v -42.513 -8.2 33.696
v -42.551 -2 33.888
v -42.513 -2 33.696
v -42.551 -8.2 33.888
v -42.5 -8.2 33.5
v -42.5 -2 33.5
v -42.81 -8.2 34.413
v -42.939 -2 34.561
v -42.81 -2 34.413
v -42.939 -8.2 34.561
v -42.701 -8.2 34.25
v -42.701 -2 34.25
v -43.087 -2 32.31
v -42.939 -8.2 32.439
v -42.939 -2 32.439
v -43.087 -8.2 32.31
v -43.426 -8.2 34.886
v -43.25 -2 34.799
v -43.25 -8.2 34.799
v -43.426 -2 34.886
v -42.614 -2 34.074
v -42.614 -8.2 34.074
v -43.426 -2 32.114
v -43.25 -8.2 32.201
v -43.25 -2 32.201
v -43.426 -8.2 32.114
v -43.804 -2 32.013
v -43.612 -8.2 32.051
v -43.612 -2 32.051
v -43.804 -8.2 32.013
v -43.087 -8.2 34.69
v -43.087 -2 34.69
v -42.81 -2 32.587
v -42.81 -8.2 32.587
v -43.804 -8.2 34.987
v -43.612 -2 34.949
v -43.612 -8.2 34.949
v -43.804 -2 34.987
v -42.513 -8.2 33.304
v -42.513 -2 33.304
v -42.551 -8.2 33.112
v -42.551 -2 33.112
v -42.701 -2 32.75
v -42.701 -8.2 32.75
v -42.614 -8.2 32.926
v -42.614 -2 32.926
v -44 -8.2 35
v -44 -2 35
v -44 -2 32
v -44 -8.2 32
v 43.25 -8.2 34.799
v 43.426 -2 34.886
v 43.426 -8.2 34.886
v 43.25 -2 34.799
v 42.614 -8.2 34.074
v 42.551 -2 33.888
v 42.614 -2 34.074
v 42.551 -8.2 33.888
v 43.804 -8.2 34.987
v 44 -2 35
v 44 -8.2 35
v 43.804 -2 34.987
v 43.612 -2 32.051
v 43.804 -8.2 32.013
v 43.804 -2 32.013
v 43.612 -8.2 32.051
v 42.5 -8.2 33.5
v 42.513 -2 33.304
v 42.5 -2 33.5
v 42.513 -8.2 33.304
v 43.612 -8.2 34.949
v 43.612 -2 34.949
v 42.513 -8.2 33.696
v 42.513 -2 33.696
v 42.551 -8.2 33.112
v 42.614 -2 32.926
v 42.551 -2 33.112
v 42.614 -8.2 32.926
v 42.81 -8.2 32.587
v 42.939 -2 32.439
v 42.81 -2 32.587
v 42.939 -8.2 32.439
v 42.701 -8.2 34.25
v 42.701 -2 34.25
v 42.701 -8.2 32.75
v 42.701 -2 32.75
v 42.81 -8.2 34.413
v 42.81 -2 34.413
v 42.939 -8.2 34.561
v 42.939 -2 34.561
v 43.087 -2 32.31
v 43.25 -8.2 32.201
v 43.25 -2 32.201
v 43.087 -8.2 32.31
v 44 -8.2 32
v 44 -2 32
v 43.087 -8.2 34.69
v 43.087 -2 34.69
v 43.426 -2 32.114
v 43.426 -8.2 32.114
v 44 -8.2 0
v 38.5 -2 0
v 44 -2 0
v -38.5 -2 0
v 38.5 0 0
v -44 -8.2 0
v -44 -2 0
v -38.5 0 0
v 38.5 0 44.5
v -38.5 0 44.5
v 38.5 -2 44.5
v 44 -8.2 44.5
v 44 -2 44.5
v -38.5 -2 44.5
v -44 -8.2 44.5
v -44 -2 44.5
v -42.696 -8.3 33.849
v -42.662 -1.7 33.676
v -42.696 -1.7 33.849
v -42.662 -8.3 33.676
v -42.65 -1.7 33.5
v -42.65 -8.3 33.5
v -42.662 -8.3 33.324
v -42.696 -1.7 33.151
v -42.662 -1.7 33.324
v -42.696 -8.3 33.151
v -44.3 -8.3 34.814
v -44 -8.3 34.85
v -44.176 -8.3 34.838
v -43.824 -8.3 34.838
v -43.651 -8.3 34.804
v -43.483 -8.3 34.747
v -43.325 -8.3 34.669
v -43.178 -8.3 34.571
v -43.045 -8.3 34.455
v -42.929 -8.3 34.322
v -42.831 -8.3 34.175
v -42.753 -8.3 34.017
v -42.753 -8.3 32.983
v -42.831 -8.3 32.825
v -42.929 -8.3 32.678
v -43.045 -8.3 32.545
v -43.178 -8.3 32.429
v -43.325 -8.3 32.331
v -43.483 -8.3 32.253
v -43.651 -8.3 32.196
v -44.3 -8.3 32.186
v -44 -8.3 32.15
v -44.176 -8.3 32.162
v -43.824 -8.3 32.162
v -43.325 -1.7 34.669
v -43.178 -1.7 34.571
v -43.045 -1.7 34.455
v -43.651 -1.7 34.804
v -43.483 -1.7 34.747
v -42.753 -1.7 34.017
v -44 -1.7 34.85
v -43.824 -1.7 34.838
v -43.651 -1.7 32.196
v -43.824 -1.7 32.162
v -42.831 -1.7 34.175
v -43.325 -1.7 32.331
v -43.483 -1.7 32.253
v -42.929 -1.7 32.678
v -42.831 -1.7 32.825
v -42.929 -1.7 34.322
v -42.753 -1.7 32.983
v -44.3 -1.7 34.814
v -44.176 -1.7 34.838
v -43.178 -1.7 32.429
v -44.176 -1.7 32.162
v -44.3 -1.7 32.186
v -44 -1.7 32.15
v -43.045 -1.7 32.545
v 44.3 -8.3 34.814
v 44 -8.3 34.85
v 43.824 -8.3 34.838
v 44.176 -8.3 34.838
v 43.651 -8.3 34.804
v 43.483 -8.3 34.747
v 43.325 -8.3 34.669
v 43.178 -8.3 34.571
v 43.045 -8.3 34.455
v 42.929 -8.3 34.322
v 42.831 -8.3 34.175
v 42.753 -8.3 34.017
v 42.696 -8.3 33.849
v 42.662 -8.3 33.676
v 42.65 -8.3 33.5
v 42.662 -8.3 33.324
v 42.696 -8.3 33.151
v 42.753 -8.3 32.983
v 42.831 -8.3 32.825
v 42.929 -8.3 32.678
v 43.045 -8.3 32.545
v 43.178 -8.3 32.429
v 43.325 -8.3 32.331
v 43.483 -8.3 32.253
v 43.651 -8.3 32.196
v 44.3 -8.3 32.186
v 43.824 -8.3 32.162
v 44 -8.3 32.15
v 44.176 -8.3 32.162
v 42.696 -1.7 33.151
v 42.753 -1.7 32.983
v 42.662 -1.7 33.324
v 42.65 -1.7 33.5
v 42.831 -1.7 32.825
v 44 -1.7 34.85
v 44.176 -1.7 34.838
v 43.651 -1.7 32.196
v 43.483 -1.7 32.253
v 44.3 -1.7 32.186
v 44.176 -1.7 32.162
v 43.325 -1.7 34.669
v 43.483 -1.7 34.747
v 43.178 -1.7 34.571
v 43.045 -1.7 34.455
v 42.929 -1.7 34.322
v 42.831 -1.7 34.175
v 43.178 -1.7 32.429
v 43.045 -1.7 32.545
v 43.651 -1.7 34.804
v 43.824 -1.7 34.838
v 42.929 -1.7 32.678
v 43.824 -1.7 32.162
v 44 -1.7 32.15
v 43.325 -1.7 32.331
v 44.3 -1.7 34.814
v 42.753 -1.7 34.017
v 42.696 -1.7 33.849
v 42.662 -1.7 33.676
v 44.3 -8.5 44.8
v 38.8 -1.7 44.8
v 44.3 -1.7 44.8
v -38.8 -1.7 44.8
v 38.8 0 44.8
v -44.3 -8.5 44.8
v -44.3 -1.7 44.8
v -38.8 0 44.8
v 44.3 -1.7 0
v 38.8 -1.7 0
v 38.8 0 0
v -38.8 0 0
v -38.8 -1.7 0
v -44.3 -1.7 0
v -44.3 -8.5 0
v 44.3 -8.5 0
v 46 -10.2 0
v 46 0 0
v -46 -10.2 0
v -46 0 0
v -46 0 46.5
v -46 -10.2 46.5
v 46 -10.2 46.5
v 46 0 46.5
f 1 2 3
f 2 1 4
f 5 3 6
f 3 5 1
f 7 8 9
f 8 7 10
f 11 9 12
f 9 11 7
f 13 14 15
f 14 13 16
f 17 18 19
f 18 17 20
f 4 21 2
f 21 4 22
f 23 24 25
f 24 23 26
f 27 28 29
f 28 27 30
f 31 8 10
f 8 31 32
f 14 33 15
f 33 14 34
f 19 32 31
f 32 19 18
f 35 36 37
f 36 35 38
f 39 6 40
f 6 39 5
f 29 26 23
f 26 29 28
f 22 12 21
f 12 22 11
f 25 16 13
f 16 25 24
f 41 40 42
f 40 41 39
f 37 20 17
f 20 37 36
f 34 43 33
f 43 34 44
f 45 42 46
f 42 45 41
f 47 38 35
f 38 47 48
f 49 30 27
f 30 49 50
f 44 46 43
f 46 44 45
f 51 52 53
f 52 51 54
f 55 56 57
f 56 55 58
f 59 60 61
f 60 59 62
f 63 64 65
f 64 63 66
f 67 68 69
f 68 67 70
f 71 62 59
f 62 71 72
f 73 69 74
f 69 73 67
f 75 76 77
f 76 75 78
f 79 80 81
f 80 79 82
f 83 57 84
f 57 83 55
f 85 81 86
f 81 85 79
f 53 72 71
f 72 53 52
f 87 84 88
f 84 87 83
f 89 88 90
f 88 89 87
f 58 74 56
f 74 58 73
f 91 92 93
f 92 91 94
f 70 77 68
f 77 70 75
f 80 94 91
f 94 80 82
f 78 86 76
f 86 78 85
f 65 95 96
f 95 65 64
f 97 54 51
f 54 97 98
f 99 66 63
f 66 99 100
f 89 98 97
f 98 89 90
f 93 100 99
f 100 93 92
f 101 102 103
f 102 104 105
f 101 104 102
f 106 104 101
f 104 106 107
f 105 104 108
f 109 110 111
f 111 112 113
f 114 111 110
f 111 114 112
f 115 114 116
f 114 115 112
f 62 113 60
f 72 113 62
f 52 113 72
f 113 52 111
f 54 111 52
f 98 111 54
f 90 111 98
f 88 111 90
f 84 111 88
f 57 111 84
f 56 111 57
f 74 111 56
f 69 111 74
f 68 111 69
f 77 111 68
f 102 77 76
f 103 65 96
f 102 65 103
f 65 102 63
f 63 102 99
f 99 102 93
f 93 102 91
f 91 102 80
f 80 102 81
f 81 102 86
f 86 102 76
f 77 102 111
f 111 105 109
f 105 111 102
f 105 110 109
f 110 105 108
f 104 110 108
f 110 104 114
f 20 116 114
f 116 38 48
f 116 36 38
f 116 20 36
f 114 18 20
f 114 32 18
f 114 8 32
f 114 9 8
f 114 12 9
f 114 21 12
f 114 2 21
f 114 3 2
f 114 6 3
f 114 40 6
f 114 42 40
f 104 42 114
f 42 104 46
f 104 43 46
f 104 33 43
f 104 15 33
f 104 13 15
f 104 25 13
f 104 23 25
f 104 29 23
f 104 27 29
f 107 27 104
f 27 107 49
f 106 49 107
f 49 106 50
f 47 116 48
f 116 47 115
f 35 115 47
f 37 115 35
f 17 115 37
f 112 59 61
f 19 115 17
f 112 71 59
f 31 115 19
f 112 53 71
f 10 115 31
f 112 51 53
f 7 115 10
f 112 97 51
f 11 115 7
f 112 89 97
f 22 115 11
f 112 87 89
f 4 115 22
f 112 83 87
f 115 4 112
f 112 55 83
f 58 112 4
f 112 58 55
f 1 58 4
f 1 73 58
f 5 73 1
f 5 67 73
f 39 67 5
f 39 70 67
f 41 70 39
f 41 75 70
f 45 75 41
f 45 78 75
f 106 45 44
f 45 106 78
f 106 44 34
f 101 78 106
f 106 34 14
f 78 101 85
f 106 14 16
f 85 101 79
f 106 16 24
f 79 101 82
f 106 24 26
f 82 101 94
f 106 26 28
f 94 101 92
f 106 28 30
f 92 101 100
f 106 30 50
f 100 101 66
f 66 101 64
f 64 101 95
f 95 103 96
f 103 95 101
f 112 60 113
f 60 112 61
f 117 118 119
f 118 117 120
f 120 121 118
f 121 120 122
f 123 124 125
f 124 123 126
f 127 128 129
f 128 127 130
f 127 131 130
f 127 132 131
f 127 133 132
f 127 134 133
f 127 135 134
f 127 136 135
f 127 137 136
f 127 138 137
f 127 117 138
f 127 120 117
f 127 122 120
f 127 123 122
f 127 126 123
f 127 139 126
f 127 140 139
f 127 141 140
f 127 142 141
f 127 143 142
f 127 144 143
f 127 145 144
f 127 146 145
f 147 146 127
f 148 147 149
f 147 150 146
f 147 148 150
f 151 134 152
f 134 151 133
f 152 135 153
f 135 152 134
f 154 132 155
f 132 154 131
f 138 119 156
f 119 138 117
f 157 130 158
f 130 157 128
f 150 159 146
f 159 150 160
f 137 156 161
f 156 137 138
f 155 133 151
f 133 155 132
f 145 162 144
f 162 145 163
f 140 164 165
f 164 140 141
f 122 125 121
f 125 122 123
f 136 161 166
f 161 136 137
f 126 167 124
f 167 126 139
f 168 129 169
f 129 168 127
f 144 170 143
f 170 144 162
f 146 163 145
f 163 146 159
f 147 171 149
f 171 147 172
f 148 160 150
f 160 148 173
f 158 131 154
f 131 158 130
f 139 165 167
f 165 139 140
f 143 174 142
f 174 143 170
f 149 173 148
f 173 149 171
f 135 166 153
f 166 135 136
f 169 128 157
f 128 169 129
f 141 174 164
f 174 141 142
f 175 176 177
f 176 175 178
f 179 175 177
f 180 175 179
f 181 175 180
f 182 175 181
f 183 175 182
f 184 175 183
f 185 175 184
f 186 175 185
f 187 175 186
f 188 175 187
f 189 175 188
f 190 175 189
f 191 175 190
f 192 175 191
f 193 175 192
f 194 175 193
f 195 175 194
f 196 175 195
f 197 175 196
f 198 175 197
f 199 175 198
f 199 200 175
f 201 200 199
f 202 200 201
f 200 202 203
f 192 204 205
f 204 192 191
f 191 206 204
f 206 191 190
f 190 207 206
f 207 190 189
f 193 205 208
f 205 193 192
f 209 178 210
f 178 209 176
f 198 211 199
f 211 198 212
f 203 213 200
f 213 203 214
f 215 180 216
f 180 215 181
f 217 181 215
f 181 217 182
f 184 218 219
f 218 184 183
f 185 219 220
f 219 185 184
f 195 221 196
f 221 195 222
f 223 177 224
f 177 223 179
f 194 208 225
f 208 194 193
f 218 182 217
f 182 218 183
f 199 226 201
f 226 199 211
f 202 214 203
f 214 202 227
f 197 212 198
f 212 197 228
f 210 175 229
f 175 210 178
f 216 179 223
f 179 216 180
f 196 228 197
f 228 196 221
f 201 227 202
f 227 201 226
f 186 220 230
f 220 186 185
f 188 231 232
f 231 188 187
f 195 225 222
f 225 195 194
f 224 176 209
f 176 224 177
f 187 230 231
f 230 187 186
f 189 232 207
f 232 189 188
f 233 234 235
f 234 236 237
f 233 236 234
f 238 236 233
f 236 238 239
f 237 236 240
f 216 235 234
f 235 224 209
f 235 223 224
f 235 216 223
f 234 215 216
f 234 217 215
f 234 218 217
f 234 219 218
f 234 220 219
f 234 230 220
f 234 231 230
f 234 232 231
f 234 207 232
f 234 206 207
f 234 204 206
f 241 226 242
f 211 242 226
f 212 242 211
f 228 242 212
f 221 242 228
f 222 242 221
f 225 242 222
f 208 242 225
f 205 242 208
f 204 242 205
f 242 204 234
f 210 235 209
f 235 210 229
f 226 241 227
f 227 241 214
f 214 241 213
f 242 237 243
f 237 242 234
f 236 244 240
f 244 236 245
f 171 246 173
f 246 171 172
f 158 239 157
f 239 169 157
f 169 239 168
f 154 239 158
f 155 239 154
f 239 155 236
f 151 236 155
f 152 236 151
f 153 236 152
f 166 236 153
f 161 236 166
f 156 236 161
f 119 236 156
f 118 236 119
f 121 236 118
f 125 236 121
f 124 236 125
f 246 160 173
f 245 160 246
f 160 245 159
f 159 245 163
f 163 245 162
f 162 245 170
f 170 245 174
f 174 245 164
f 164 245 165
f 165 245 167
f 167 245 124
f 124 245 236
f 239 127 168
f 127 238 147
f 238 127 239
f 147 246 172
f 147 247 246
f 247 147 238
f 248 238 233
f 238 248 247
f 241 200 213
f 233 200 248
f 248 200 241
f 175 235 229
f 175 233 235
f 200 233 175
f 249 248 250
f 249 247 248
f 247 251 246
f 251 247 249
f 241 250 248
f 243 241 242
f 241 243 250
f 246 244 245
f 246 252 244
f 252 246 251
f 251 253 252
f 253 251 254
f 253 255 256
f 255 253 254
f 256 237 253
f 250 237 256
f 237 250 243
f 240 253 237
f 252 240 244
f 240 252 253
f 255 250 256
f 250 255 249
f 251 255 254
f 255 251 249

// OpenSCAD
/* [Wall Hook] */
//Dimensions of the front plate (holder)
wllHkPltDims=[88,6.2,44.5];
//Dimension of the back plate (wall)
wllHkBckDims=[77,2,44.5];
wllHkNudgeZPos=33.5;
wllHkNudgeDia=3;

/* [Dimensions] */
minWallThck=1.2;

/* [Bottles] */

/* [show] */
showWallHk=true;
showInterface=true;

/* [Hidden]*/
wllHkOvDims=[wllHkPltDims.x,wllHkBckDims.y+wllHkPltDims.y,wllHkBckDims.z];

fudge=0.1;
$fn=48;

if (showWallHk)
  wallHook();
if (showInterface)
  interface();

module wallHook(cut=false){
  spcng= cut ? 0.3 : 0;
  
  difference(){
    translate([0,0,-spcng]) linear_extrude(wllHkBckDims.z+spcng*2,convexity=3){
      translate([0,-wllHkBckDims.y/2+spcng/2]) square([wllHkBckDims.x+spcng*2,wllHkBckDims.y+spcng],true);
      translate([0,-wllHkBckDims.y-wllHkPltDims.y/2]) square([wllHkPltDims.x+spcng*2,wllHkPltDims.y+spcng*2],true);
    }
    for (ix=[-1,1])
      translate([ix*wllHkPltDims.x/2,0,wllHkNudgeZPos]) 
        rotate([90,0,0]) cylinder(d=wllHkNudgeDia-spcng,h=wllHkOvDims.y+fudge);
  }  
}

module interface(){
  ifWallThck=wllHkBckDims.y;
  difference(){
    linear_extrude(wllHkBckDims.z+ifWallThck) 
      translate([0,-wllHkPltDims.y/2-ifWallThck]) square([wllHkPltDims.x+ifWallThck*2,wllHkPltDims.y+ifWallThck*2],true);
    wallHook(cut=true);
  }
}
